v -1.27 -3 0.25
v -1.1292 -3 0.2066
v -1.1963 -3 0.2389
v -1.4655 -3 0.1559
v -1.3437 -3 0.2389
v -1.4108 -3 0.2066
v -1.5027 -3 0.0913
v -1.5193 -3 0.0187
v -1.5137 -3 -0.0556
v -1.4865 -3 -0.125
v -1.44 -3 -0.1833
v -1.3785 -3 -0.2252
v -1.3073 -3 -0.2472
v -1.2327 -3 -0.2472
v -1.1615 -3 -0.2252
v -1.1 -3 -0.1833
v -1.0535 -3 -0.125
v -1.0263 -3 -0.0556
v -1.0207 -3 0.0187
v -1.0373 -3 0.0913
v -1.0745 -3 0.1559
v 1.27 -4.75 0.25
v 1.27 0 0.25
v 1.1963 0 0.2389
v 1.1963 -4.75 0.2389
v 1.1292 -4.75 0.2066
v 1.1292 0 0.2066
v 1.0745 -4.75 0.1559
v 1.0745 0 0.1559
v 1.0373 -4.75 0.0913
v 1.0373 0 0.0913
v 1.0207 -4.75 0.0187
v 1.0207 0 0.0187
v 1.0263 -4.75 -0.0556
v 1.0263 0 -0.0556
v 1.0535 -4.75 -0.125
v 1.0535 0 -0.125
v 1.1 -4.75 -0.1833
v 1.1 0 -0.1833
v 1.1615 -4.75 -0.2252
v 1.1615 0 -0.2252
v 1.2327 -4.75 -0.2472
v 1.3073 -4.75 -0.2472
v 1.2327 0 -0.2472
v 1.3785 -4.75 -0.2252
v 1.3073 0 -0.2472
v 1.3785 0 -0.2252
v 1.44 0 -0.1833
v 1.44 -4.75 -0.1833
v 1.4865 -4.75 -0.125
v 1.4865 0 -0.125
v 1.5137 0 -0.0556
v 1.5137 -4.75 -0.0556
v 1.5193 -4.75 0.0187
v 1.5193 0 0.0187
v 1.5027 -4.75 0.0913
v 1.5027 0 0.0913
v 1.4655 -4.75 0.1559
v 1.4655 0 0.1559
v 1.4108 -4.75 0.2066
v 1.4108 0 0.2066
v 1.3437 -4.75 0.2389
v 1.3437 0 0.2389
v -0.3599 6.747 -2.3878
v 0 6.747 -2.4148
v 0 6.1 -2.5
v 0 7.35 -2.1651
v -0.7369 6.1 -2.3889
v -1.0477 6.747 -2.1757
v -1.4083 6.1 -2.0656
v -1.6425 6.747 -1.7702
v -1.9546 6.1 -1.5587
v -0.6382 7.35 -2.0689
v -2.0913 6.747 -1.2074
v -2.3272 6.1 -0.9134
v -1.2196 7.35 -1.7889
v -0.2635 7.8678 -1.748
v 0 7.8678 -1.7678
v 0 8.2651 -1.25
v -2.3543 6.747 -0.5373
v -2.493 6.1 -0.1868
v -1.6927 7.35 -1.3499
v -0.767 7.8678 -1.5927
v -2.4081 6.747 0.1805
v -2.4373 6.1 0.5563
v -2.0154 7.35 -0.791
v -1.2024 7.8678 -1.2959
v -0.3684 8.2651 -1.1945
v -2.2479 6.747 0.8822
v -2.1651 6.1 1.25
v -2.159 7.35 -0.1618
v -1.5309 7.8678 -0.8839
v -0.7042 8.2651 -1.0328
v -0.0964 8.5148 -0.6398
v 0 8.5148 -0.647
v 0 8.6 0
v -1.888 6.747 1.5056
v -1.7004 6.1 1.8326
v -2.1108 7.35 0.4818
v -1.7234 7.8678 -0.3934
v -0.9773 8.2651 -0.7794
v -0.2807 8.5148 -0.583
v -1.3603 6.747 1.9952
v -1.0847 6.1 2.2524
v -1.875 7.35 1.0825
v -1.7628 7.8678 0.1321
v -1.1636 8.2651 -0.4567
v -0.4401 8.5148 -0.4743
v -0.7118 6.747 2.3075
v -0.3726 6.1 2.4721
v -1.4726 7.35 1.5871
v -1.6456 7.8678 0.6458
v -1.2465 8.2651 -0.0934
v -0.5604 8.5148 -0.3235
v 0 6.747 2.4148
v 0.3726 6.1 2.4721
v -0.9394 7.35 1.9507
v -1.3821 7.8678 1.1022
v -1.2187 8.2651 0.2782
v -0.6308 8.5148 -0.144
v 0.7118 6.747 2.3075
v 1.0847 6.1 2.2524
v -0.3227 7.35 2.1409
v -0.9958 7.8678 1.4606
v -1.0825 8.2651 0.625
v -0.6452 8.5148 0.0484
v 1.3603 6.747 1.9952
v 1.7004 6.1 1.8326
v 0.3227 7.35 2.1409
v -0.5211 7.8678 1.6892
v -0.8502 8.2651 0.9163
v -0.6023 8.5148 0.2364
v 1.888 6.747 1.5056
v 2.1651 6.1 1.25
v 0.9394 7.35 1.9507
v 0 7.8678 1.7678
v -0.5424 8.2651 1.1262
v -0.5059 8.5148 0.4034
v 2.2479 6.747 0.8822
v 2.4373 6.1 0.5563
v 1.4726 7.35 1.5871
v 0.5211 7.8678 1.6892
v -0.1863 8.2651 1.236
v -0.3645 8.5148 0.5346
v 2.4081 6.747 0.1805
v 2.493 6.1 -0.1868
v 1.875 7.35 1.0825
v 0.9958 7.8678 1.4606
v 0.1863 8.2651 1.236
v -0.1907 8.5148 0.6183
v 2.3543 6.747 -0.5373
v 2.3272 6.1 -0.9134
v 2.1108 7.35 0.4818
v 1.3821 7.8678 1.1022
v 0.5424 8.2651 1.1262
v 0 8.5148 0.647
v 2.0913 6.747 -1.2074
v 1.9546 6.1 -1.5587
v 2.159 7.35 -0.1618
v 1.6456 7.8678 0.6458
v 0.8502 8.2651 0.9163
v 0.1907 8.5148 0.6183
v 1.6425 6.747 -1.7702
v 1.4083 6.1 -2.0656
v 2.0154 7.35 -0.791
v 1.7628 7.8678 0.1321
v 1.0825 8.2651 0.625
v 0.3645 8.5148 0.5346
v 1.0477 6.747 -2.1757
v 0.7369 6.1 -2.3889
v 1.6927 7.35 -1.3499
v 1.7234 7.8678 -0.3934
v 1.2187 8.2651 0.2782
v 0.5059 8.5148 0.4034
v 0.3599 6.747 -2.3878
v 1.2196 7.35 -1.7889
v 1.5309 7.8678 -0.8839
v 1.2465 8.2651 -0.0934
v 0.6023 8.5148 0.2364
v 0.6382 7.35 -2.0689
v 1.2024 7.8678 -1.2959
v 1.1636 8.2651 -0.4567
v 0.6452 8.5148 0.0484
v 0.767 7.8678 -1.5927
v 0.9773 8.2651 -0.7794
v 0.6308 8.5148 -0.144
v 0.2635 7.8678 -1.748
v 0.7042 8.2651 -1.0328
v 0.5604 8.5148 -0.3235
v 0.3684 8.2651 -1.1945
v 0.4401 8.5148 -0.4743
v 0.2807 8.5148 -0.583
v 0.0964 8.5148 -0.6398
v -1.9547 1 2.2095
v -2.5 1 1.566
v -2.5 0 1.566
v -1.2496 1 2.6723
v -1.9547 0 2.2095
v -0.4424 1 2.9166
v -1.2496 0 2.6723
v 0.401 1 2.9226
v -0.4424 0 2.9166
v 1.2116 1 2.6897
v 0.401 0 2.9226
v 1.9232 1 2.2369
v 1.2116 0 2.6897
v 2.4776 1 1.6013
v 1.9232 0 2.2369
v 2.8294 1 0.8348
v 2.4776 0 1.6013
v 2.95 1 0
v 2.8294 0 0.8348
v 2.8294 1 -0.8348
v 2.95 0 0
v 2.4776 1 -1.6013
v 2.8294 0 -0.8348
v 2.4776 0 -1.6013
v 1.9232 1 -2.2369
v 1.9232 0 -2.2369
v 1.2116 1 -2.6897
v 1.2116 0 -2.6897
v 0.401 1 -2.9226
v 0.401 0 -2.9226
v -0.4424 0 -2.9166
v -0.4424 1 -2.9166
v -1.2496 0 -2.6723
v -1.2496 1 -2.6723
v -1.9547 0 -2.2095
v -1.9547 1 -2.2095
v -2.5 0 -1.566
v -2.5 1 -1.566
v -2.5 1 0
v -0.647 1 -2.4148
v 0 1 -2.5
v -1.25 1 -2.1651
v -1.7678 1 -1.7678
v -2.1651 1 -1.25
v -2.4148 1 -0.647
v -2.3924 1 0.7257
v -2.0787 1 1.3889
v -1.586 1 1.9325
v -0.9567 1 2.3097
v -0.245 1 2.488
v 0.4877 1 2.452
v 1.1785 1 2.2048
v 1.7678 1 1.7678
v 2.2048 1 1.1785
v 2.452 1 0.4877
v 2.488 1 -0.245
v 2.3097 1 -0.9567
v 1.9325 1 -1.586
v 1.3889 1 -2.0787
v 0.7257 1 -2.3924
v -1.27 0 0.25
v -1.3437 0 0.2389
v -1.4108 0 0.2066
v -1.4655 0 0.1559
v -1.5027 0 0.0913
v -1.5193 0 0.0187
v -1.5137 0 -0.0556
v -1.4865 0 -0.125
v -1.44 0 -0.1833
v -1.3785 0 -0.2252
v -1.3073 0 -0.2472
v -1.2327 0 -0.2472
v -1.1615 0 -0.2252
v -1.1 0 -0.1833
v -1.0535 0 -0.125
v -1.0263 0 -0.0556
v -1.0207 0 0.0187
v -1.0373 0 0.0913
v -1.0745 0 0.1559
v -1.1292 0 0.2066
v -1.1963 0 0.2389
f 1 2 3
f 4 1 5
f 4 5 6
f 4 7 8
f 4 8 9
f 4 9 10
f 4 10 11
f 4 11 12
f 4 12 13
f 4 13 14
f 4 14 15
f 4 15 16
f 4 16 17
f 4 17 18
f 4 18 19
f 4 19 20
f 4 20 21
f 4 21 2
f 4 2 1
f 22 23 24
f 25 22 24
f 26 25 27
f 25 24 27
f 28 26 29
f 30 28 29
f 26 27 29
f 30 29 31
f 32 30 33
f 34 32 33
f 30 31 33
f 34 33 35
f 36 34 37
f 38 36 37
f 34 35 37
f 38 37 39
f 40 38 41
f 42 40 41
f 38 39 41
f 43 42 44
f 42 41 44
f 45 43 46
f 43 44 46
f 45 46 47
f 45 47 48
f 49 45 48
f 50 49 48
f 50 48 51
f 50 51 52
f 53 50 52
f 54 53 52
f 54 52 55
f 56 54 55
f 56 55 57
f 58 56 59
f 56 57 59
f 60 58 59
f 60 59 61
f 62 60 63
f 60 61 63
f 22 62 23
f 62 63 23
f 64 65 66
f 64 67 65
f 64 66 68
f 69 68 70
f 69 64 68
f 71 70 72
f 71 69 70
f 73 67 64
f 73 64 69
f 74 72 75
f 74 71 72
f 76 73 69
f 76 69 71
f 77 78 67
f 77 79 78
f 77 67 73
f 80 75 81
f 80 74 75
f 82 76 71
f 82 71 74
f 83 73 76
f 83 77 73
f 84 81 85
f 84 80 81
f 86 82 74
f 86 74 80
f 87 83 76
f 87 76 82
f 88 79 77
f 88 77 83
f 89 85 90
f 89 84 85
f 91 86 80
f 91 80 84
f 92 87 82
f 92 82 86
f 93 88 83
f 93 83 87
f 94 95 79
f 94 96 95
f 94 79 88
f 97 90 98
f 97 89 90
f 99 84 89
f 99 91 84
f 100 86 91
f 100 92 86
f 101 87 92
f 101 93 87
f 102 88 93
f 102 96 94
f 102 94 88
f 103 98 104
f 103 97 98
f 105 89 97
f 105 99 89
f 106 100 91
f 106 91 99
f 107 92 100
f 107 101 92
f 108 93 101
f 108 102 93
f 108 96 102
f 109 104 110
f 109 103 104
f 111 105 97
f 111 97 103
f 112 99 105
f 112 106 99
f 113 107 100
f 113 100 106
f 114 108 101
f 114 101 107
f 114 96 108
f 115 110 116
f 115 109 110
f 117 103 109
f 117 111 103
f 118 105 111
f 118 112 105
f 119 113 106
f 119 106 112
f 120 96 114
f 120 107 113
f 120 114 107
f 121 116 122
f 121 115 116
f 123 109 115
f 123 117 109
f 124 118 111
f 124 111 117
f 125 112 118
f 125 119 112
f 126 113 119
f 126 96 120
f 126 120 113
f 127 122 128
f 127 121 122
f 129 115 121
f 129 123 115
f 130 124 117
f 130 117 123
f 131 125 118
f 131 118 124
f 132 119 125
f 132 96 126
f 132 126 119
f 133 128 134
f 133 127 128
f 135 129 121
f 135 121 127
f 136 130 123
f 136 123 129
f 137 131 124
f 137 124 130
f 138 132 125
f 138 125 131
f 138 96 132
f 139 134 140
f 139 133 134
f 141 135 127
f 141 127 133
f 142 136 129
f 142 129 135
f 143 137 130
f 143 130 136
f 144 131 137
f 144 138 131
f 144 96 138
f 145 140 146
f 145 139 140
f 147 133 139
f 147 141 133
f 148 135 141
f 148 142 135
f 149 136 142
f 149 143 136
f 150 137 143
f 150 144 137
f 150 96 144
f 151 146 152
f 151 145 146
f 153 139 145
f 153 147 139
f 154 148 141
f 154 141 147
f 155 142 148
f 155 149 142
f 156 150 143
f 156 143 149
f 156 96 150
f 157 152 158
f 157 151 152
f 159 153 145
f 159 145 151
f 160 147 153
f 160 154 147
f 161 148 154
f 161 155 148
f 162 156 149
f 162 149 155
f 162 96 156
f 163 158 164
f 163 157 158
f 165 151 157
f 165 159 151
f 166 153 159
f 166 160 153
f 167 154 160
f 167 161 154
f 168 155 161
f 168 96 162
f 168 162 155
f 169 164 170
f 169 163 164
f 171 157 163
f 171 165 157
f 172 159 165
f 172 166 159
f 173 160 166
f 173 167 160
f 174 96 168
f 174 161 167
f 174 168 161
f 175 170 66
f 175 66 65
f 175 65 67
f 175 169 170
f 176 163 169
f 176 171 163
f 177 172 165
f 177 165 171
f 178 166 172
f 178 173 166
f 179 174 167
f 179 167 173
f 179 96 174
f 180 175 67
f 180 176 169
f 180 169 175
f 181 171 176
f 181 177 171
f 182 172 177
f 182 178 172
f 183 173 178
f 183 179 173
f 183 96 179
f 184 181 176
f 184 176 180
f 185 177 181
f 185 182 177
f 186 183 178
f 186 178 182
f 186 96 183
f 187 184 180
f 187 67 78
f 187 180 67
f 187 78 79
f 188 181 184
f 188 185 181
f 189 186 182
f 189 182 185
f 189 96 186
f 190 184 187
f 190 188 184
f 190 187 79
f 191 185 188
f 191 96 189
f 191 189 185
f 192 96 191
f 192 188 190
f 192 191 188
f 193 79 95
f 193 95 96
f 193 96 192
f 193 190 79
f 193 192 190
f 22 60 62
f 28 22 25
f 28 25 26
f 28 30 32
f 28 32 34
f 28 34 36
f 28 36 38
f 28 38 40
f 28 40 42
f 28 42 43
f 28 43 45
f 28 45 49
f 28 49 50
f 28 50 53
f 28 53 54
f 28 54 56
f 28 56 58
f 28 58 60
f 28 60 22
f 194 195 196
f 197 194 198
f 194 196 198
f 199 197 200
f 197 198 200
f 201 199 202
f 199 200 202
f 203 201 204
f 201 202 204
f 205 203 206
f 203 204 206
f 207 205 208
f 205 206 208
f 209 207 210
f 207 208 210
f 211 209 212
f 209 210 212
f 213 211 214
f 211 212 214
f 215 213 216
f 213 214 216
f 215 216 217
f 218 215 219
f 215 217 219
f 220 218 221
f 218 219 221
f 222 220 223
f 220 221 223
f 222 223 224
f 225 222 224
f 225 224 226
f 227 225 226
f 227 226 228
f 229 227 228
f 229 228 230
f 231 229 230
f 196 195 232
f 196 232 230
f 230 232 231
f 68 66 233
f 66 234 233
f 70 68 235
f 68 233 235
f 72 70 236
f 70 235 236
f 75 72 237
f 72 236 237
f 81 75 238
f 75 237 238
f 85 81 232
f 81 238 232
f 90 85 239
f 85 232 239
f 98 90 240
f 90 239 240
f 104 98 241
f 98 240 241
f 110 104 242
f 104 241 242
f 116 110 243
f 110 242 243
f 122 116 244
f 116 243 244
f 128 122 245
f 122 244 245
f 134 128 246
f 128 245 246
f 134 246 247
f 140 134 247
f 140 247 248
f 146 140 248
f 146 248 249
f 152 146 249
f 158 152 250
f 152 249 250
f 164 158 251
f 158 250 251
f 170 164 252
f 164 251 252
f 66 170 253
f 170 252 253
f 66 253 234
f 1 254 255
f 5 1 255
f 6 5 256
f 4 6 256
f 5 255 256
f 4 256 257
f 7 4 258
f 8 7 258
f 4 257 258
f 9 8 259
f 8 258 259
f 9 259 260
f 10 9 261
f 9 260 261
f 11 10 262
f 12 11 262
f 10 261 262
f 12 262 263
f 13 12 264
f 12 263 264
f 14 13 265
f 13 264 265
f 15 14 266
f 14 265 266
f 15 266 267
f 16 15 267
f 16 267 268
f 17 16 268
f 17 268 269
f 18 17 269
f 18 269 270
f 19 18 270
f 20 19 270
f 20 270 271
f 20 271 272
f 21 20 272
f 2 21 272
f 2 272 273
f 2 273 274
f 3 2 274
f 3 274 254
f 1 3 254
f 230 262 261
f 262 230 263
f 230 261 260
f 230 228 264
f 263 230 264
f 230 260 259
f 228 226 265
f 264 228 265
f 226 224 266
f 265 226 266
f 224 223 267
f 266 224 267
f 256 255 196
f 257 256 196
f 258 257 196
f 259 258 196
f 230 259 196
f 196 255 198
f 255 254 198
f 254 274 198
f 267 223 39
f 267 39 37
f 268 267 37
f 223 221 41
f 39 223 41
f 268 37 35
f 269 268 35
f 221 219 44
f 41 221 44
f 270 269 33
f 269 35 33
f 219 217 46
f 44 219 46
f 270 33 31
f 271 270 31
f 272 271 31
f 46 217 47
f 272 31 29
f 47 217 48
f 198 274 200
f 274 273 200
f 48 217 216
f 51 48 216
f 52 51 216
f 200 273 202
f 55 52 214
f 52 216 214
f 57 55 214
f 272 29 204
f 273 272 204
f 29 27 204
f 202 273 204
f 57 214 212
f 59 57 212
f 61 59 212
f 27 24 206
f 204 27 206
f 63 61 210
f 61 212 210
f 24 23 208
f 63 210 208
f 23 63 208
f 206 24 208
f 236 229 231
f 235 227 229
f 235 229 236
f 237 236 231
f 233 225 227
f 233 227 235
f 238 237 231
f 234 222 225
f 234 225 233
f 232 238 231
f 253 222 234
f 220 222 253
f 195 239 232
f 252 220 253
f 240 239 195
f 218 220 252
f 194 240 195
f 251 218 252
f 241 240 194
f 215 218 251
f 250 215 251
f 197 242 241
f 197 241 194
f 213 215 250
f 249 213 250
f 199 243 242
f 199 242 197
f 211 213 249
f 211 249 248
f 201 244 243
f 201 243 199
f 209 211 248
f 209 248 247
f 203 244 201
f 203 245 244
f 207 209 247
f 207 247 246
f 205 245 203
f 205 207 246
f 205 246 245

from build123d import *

# Parameters (mm, degrees)
SKETCH1_R           = 2.95
BOSS_EXTRUDE1_DEPTH = 1
SKETCH2_R           = 2.5
BOSS_EXTRUDE2_DEPTH = 7.6
FILLET1_R           = 2.5
SKETCH3_R           = 0.25
BOSS_EXTRUDE3_DEPTH = 4.75
CUT_EXTRUDE1_START  = -1.75
SKETCH4_R           = 0.25
CUT_EXTRUDE1_DEPTH  = 1.75
CUT_EXTRUDE2_DEPTH  = 9.669775084


with BuildPart() as part:
    # Sketch1 → Boss-Extrude1 (new body)
    with BuildSketch(Plane(origin=(0, 0, 0), x_dir=(1, 0, 0), z_dir=(0, 1, 0))):
        with Locations(Location((0, 0, 0), (0, 0, 270))):
            Circle(SKETCH1_R)
    extrude(amount=BOSS_EXTRUDE1_DEPTH)

    # Sketch2 → Boss-Extrude2 (add)
    with BuildSketch(Plane(origin=(0, 1, 0), x_dir=(1, 0, 0), z_dir=(0, 1, 0))):
        with Locations(Location((0, 0, 0), (0, 0, 90))):
            Circle(SKETCH2_R)
    extrude(amount=BOSS_EXTRUDE2_DEPTH)

    # Fillet1
    fillet1_edges = [part.edges().sort_by_distance(p)[0] for p in [
        (0, 8.6, 2.5),
    ]]
    fillet(fillet1_edges, radius=FILLET1_R)

    # Sketch3 → Boss-Extrude3 (add)
    with BuildSketch(Plane.XZ):
        with Locations(Location((-1.27, 0, 0), (0, 0, 90))):
            Circle(SKETCH3_R)
        with Locations(Location((1.27, 0, 0), (0, 0, 90))):
            Circle(SKETCH3_R)
    extrude(amount=BOSS_EXTRUDE3_DEPTH)

    # Sketch4 → Cut-Extrude1 (cut)
    with BuildSketch(Plane.XZ.offset(4.75).offset(CUT_EXTRUDE1_START)):
        with Locations(Location((-1.27, 0, 0), (0, 0, 90))):
            Circle(SKETCH4_R)
    extrude(amount=CUT_EXTRUDE1_DEPTH, mode=Mode.SUBTRACT)

    # Sketch5 → Cut-Extrude2 (cut, through all)
    with BuildSketch(Plane(origin=(0, 1, 0), x_dir=(1, 0, 0), z_dir=(0, 1, 0))):
        Polygon((-2.5, 0), (-2.5, 1.983520803), (-3.125999015, 1.983520803), (-3.125999015, 0), (-3.125999015, -2.184477883), (-2.5, -2.184477883), align=None)
    extrude(amount=-CUT_EXTRUDE2_DEPTH, mode=Mode.SUBTRACT)


solid = part.part
